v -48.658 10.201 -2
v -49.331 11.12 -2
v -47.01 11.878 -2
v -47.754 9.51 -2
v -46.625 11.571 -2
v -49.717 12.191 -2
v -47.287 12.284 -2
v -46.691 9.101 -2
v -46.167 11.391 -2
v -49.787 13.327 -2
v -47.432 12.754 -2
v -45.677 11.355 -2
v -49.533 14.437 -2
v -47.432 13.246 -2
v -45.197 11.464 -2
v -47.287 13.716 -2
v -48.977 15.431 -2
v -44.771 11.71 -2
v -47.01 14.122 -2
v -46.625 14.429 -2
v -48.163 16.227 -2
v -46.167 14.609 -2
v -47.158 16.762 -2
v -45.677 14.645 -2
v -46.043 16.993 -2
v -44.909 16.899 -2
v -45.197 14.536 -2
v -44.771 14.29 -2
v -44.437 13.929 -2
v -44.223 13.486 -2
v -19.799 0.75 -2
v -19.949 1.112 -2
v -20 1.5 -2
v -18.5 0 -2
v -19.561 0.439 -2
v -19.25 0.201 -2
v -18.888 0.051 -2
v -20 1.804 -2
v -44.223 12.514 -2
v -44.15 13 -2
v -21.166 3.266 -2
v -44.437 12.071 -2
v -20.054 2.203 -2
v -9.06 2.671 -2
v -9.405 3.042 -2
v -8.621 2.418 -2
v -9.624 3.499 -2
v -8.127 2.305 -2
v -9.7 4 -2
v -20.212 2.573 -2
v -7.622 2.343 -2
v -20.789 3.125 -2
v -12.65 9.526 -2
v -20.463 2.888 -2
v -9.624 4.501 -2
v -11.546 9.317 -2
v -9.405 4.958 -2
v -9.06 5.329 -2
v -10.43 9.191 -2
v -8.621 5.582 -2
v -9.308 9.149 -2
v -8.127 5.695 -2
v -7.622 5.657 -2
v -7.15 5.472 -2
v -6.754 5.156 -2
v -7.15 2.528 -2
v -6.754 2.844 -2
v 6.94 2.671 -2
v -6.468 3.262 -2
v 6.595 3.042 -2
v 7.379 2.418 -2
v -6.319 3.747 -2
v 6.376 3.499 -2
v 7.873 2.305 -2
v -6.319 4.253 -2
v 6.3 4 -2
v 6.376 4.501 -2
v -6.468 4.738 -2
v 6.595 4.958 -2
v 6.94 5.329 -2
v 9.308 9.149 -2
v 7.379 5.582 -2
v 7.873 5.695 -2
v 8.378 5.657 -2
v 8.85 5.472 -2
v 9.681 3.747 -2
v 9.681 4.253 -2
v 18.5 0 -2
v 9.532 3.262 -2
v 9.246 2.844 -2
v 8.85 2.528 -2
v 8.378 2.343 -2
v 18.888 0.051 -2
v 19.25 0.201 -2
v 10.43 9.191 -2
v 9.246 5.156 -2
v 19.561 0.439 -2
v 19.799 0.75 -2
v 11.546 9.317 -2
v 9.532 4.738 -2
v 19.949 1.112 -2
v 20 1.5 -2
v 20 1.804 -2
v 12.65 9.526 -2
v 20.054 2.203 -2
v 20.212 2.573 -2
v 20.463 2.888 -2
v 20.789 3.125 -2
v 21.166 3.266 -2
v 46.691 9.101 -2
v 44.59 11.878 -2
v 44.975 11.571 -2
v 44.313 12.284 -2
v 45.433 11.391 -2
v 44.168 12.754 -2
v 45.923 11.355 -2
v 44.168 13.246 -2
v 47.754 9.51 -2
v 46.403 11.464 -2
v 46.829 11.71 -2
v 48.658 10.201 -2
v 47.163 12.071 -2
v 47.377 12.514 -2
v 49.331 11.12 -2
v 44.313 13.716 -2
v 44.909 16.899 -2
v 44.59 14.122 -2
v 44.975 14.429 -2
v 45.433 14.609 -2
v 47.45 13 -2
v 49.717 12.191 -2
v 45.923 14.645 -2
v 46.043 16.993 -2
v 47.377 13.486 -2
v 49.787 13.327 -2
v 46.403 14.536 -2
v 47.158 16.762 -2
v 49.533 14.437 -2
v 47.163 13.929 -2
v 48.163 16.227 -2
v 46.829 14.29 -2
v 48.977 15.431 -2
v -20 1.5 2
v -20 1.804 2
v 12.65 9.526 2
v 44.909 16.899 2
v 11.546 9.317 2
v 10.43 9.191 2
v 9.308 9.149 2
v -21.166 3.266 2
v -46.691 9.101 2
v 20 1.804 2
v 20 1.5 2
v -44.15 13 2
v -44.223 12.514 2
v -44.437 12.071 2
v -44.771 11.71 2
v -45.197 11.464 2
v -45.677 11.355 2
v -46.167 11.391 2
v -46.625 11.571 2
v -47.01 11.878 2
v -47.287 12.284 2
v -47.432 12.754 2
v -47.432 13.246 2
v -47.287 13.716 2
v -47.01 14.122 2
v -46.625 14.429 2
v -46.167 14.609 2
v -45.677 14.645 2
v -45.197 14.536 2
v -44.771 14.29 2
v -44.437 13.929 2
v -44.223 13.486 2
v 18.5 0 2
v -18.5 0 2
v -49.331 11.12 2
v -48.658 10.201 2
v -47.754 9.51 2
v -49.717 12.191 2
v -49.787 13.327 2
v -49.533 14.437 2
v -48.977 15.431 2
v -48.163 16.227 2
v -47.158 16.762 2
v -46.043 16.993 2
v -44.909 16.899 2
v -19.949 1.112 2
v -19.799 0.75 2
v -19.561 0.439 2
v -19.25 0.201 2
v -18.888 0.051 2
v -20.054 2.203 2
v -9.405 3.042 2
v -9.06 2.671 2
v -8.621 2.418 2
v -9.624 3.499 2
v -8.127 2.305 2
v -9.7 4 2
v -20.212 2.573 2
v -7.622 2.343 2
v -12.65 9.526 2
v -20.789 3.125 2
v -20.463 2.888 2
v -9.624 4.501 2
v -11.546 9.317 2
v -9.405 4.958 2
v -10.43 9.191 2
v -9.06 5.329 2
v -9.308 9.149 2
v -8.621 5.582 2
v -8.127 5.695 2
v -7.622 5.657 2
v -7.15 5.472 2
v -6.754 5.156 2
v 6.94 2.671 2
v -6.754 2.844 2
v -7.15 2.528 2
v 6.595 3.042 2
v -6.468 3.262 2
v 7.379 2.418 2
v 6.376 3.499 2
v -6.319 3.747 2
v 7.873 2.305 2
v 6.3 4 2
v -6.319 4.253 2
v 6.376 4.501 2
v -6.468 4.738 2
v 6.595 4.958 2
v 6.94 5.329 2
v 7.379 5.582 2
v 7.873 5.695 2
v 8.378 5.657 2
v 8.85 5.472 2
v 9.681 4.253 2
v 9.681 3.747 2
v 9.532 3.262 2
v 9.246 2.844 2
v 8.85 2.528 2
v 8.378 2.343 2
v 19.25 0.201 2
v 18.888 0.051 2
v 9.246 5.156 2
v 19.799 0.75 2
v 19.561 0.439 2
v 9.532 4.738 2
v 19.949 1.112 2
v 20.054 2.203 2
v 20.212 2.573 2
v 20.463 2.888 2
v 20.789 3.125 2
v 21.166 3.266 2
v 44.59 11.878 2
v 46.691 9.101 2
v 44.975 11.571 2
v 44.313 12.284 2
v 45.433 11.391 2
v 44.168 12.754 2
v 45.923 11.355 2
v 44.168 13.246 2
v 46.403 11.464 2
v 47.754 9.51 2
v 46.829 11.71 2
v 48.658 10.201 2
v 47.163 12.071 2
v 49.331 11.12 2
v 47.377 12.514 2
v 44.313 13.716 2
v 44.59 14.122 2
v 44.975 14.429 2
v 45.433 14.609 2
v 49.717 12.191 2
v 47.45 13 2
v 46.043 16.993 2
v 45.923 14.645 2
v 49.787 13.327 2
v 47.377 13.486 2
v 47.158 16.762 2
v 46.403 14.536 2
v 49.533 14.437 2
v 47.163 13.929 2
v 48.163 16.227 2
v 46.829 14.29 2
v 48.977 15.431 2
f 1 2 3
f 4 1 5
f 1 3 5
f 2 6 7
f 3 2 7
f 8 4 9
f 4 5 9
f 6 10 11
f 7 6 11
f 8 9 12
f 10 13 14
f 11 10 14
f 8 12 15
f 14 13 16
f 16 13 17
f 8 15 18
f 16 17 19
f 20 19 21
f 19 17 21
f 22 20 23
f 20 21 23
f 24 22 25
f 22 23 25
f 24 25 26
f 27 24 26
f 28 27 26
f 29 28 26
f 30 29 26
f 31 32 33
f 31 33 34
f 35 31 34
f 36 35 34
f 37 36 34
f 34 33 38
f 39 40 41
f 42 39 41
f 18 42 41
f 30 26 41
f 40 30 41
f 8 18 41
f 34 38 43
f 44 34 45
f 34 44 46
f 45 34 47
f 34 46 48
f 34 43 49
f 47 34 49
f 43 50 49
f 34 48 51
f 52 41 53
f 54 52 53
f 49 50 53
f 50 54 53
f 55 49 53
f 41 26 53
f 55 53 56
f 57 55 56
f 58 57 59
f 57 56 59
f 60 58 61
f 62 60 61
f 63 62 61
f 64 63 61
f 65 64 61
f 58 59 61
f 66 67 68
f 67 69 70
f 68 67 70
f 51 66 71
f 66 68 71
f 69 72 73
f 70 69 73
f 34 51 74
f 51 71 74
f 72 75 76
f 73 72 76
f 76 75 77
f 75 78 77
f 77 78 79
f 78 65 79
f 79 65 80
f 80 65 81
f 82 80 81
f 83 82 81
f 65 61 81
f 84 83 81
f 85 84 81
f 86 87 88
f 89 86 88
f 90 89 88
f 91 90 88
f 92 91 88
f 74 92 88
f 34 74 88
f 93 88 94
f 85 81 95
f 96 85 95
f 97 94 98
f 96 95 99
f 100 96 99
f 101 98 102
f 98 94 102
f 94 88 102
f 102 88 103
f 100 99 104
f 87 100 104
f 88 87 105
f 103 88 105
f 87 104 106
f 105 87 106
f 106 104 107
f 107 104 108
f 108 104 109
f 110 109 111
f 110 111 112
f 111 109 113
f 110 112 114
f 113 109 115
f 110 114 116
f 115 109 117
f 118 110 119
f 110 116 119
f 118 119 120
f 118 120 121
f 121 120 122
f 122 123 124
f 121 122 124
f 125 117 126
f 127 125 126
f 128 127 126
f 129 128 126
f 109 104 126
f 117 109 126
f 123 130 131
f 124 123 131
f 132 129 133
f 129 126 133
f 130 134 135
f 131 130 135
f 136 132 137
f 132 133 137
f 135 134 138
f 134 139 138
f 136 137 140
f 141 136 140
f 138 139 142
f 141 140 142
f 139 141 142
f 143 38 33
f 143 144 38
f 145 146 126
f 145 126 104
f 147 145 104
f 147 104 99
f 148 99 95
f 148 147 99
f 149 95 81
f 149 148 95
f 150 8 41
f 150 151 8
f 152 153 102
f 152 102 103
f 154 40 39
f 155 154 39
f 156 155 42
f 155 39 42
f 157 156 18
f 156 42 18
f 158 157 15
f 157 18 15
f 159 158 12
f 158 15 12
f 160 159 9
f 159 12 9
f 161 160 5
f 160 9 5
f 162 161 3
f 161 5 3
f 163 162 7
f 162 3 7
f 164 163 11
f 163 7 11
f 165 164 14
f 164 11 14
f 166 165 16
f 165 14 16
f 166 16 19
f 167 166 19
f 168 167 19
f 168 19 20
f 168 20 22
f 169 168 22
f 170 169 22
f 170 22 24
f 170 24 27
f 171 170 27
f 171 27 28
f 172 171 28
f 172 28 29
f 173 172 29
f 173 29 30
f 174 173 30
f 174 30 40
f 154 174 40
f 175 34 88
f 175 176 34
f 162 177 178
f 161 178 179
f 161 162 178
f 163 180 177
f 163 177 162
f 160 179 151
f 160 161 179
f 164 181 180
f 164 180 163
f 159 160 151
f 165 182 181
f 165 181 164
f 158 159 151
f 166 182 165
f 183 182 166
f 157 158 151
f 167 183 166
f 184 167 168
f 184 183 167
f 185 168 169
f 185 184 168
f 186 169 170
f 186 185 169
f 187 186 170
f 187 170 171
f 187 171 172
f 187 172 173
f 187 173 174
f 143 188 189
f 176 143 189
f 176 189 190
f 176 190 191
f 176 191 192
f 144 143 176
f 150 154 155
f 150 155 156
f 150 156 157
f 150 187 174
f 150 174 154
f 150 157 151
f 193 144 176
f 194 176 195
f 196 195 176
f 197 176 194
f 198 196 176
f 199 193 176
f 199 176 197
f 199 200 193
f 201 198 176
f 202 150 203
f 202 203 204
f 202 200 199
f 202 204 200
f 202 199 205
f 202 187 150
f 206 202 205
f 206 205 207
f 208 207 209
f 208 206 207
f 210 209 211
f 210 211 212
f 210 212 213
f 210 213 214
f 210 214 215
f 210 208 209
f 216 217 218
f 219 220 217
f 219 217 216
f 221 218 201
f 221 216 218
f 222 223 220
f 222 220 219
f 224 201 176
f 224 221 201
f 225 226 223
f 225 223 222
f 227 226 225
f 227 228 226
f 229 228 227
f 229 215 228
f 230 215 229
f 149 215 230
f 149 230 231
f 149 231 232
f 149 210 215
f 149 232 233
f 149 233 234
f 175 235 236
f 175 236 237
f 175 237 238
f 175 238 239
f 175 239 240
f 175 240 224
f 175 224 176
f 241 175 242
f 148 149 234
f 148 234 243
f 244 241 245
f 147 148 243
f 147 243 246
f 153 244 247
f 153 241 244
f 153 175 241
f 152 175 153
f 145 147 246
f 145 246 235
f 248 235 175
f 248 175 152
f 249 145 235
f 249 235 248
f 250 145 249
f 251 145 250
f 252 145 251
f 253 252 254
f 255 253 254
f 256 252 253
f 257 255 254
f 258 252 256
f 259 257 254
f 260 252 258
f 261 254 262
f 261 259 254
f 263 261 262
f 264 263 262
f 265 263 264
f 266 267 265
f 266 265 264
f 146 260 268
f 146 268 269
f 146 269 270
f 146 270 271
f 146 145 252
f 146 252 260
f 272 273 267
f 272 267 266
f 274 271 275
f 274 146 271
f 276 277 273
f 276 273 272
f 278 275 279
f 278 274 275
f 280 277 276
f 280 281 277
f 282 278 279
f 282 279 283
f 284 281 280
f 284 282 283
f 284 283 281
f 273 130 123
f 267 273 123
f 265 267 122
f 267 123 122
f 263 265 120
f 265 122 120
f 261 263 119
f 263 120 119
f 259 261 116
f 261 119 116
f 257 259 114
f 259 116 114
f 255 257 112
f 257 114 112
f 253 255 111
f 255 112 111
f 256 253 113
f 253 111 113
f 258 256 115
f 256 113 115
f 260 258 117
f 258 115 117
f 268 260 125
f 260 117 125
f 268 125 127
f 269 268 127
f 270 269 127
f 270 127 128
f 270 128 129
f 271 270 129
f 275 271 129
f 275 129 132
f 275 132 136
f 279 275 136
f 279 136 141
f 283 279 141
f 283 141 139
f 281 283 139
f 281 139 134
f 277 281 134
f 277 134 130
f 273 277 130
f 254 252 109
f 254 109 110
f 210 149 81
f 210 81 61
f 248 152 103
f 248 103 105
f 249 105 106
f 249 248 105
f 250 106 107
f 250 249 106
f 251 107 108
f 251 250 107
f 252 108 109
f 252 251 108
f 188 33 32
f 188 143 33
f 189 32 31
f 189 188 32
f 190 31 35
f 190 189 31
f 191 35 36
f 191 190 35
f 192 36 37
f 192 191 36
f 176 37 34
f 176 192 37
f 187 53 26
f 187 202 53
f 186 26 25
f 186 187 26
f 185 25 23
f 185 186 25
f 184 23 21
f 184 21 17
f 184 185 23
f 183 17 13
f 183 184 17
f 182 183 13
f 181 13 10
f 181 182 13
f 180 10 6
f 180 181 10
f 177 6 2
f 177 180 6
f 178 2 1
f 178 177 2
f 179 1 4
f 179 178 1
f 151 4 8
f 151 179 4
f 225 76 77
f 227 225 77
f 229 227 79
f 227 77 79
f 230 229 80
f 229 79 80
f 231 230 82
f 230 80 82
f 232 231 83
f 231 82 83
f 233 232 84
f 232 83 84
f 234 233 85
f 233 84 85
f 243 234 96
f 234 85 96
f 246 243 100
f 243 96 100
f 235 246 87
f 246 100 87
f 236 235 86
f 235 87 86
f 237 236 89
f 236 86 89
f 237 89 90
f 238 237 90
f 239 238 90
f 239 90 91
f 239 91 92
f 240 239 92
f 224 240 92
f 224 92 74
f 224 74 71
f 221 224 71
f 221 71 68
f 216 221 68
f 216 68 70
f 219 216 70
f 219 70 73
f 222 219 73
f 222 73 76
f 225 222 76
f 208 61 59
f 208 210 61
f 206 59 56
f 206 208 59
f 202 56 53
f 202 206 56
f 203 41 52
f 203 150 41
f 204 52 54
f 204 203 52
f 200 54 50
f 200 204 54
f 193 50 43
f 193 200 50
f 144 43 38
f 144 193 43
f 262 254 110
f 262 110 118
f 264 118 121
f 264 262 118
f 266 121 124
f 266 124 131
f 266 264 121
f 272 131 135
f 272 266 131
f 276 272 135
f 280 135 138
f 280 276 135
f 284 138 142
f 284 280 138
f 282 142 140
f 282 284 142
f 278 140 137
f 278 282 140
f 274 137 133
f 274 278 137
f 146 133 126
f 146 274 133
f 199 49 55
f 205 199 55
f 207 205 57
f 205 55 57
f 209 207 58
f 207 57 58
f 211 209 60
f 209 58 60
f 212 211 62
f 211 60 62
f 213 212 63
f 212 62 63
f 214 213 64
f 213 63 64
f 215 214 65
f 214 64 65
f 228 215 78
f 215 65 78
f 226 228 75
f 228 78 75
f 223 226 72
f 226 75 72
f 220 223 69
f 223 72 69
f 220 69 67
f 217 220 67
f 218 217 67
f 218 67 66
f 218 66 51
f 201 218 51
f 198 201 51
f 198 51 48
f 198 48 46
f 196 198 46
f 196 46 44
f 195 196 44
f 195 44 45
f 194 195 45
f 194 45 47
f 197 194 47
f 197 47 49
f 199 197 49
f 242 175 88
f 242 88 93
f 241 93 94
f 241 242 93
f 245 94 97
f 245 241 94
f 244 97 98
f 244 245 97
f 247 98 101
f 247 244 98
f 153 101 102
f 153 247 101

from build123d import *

# Parameters (mm, degrees)
SKETCH2_R             = 0.5
BASE_DEPTH            = 2
M3_CLEARANCE_HOLE1_D  = 3.4
M4X0_7_TAPPED_HOLE1_D = 3.3


with BuildPart() as part:
    # Sketch2 → Base (new body, symmetric)
    with BuildSketch(Plane.XY):
        with BuildLine():
            Line((-18.5, 0), (18.5, 0))
            ThreePointArc((18.5, 0), (19.560660172, 0.439339828), (20, 1.5))
            Line((20, 1.5), (20, 1.8041591))
            ThreePointArc((20, 1.8041591), (20.327112072, 2.739217337), (21.165778543, 3.266450459))
            Line((21.165778543, 3.266450459), (46.691257218, 9.100556377))
            ThreePointArc((46.691257218, 9.100556377), (49.699443623, 13.891257218), (44.908742782, 16.899443623))
            Line((44.908742782, 16.899443623), (12.649834838, 9.526344449))
            ThreePointArc((12.649834838, 9.526344449), (10.989330142, 9.243827753), (9.307620269, 9.149258036))
            Line((9.307620269, 9.149258036), (-9.307620269, 9.149258036))
            ThreePointArc((-9.307620269, 9.149258036), (-10.989330142, 9.243827753), (-12.649834838, 9.526344449))
            Line((-12.649834838, 9.526344449), (-44.908742782, 16.899443623))
            ThreePointArc((-44.908742782, 16.899443623), (-49.699443623, 13.891257218), (-46.691257218, 9.100556377))
            Line((-46.691257218, 9.100556377), (-21.165778543, 3.266450459))
            ThreePointArc((-21.165778543, 3.266450459), (-20.327112072, 2.739217337), (-20, 1.8041591))
            Line((-20, 1.8041591), (-20, 1.5))
            ThreePointArc((-20, 1.5), (-19.560660172, 0.439339828), (-18.5, 0))
        make_face()
        with Locations((-45.8, 13)):
            Circle(SKETCH2_R, mode=Mode.SUBTRACT)
        with Locations((-8, 4)):
            Circle(SKETCH2_R, mode=Mode.SUBTRACT)
        with Locations((8, 4)):
            Circle(SKETCH2_R, mode=Mode.SUBTRACT)
        with Locations((45.8, 13)):
            Circle(SKETCH2_R, mode=Mode.SUBTRACT)
    extrude(amount=BASE_DEPTH, both=True)

    # M3 Clearance Hole1 (through all)
    with Locations(Plane(origin=(0, 4, 2), x_dir=(1, 0, 0), z_dir=(0, 0, 1))):
        with Locations((-8, 0), (8, 0)):
            Hole(M3_CLEARANCE_HOLE1_D / 2)

    # M4x0.7 Tapped Hole1 (through all)
    with Locations(Plane(origin=(0, 0, 2), x_dir=(-1, 0, 0), z_dir=(0, 0, 1))):
        with Locations((-45.8, -13), (45.8, -13)):
            Hole(M4X0_7_TAPPED_HOLE1_D / 2)


solid = part.part
